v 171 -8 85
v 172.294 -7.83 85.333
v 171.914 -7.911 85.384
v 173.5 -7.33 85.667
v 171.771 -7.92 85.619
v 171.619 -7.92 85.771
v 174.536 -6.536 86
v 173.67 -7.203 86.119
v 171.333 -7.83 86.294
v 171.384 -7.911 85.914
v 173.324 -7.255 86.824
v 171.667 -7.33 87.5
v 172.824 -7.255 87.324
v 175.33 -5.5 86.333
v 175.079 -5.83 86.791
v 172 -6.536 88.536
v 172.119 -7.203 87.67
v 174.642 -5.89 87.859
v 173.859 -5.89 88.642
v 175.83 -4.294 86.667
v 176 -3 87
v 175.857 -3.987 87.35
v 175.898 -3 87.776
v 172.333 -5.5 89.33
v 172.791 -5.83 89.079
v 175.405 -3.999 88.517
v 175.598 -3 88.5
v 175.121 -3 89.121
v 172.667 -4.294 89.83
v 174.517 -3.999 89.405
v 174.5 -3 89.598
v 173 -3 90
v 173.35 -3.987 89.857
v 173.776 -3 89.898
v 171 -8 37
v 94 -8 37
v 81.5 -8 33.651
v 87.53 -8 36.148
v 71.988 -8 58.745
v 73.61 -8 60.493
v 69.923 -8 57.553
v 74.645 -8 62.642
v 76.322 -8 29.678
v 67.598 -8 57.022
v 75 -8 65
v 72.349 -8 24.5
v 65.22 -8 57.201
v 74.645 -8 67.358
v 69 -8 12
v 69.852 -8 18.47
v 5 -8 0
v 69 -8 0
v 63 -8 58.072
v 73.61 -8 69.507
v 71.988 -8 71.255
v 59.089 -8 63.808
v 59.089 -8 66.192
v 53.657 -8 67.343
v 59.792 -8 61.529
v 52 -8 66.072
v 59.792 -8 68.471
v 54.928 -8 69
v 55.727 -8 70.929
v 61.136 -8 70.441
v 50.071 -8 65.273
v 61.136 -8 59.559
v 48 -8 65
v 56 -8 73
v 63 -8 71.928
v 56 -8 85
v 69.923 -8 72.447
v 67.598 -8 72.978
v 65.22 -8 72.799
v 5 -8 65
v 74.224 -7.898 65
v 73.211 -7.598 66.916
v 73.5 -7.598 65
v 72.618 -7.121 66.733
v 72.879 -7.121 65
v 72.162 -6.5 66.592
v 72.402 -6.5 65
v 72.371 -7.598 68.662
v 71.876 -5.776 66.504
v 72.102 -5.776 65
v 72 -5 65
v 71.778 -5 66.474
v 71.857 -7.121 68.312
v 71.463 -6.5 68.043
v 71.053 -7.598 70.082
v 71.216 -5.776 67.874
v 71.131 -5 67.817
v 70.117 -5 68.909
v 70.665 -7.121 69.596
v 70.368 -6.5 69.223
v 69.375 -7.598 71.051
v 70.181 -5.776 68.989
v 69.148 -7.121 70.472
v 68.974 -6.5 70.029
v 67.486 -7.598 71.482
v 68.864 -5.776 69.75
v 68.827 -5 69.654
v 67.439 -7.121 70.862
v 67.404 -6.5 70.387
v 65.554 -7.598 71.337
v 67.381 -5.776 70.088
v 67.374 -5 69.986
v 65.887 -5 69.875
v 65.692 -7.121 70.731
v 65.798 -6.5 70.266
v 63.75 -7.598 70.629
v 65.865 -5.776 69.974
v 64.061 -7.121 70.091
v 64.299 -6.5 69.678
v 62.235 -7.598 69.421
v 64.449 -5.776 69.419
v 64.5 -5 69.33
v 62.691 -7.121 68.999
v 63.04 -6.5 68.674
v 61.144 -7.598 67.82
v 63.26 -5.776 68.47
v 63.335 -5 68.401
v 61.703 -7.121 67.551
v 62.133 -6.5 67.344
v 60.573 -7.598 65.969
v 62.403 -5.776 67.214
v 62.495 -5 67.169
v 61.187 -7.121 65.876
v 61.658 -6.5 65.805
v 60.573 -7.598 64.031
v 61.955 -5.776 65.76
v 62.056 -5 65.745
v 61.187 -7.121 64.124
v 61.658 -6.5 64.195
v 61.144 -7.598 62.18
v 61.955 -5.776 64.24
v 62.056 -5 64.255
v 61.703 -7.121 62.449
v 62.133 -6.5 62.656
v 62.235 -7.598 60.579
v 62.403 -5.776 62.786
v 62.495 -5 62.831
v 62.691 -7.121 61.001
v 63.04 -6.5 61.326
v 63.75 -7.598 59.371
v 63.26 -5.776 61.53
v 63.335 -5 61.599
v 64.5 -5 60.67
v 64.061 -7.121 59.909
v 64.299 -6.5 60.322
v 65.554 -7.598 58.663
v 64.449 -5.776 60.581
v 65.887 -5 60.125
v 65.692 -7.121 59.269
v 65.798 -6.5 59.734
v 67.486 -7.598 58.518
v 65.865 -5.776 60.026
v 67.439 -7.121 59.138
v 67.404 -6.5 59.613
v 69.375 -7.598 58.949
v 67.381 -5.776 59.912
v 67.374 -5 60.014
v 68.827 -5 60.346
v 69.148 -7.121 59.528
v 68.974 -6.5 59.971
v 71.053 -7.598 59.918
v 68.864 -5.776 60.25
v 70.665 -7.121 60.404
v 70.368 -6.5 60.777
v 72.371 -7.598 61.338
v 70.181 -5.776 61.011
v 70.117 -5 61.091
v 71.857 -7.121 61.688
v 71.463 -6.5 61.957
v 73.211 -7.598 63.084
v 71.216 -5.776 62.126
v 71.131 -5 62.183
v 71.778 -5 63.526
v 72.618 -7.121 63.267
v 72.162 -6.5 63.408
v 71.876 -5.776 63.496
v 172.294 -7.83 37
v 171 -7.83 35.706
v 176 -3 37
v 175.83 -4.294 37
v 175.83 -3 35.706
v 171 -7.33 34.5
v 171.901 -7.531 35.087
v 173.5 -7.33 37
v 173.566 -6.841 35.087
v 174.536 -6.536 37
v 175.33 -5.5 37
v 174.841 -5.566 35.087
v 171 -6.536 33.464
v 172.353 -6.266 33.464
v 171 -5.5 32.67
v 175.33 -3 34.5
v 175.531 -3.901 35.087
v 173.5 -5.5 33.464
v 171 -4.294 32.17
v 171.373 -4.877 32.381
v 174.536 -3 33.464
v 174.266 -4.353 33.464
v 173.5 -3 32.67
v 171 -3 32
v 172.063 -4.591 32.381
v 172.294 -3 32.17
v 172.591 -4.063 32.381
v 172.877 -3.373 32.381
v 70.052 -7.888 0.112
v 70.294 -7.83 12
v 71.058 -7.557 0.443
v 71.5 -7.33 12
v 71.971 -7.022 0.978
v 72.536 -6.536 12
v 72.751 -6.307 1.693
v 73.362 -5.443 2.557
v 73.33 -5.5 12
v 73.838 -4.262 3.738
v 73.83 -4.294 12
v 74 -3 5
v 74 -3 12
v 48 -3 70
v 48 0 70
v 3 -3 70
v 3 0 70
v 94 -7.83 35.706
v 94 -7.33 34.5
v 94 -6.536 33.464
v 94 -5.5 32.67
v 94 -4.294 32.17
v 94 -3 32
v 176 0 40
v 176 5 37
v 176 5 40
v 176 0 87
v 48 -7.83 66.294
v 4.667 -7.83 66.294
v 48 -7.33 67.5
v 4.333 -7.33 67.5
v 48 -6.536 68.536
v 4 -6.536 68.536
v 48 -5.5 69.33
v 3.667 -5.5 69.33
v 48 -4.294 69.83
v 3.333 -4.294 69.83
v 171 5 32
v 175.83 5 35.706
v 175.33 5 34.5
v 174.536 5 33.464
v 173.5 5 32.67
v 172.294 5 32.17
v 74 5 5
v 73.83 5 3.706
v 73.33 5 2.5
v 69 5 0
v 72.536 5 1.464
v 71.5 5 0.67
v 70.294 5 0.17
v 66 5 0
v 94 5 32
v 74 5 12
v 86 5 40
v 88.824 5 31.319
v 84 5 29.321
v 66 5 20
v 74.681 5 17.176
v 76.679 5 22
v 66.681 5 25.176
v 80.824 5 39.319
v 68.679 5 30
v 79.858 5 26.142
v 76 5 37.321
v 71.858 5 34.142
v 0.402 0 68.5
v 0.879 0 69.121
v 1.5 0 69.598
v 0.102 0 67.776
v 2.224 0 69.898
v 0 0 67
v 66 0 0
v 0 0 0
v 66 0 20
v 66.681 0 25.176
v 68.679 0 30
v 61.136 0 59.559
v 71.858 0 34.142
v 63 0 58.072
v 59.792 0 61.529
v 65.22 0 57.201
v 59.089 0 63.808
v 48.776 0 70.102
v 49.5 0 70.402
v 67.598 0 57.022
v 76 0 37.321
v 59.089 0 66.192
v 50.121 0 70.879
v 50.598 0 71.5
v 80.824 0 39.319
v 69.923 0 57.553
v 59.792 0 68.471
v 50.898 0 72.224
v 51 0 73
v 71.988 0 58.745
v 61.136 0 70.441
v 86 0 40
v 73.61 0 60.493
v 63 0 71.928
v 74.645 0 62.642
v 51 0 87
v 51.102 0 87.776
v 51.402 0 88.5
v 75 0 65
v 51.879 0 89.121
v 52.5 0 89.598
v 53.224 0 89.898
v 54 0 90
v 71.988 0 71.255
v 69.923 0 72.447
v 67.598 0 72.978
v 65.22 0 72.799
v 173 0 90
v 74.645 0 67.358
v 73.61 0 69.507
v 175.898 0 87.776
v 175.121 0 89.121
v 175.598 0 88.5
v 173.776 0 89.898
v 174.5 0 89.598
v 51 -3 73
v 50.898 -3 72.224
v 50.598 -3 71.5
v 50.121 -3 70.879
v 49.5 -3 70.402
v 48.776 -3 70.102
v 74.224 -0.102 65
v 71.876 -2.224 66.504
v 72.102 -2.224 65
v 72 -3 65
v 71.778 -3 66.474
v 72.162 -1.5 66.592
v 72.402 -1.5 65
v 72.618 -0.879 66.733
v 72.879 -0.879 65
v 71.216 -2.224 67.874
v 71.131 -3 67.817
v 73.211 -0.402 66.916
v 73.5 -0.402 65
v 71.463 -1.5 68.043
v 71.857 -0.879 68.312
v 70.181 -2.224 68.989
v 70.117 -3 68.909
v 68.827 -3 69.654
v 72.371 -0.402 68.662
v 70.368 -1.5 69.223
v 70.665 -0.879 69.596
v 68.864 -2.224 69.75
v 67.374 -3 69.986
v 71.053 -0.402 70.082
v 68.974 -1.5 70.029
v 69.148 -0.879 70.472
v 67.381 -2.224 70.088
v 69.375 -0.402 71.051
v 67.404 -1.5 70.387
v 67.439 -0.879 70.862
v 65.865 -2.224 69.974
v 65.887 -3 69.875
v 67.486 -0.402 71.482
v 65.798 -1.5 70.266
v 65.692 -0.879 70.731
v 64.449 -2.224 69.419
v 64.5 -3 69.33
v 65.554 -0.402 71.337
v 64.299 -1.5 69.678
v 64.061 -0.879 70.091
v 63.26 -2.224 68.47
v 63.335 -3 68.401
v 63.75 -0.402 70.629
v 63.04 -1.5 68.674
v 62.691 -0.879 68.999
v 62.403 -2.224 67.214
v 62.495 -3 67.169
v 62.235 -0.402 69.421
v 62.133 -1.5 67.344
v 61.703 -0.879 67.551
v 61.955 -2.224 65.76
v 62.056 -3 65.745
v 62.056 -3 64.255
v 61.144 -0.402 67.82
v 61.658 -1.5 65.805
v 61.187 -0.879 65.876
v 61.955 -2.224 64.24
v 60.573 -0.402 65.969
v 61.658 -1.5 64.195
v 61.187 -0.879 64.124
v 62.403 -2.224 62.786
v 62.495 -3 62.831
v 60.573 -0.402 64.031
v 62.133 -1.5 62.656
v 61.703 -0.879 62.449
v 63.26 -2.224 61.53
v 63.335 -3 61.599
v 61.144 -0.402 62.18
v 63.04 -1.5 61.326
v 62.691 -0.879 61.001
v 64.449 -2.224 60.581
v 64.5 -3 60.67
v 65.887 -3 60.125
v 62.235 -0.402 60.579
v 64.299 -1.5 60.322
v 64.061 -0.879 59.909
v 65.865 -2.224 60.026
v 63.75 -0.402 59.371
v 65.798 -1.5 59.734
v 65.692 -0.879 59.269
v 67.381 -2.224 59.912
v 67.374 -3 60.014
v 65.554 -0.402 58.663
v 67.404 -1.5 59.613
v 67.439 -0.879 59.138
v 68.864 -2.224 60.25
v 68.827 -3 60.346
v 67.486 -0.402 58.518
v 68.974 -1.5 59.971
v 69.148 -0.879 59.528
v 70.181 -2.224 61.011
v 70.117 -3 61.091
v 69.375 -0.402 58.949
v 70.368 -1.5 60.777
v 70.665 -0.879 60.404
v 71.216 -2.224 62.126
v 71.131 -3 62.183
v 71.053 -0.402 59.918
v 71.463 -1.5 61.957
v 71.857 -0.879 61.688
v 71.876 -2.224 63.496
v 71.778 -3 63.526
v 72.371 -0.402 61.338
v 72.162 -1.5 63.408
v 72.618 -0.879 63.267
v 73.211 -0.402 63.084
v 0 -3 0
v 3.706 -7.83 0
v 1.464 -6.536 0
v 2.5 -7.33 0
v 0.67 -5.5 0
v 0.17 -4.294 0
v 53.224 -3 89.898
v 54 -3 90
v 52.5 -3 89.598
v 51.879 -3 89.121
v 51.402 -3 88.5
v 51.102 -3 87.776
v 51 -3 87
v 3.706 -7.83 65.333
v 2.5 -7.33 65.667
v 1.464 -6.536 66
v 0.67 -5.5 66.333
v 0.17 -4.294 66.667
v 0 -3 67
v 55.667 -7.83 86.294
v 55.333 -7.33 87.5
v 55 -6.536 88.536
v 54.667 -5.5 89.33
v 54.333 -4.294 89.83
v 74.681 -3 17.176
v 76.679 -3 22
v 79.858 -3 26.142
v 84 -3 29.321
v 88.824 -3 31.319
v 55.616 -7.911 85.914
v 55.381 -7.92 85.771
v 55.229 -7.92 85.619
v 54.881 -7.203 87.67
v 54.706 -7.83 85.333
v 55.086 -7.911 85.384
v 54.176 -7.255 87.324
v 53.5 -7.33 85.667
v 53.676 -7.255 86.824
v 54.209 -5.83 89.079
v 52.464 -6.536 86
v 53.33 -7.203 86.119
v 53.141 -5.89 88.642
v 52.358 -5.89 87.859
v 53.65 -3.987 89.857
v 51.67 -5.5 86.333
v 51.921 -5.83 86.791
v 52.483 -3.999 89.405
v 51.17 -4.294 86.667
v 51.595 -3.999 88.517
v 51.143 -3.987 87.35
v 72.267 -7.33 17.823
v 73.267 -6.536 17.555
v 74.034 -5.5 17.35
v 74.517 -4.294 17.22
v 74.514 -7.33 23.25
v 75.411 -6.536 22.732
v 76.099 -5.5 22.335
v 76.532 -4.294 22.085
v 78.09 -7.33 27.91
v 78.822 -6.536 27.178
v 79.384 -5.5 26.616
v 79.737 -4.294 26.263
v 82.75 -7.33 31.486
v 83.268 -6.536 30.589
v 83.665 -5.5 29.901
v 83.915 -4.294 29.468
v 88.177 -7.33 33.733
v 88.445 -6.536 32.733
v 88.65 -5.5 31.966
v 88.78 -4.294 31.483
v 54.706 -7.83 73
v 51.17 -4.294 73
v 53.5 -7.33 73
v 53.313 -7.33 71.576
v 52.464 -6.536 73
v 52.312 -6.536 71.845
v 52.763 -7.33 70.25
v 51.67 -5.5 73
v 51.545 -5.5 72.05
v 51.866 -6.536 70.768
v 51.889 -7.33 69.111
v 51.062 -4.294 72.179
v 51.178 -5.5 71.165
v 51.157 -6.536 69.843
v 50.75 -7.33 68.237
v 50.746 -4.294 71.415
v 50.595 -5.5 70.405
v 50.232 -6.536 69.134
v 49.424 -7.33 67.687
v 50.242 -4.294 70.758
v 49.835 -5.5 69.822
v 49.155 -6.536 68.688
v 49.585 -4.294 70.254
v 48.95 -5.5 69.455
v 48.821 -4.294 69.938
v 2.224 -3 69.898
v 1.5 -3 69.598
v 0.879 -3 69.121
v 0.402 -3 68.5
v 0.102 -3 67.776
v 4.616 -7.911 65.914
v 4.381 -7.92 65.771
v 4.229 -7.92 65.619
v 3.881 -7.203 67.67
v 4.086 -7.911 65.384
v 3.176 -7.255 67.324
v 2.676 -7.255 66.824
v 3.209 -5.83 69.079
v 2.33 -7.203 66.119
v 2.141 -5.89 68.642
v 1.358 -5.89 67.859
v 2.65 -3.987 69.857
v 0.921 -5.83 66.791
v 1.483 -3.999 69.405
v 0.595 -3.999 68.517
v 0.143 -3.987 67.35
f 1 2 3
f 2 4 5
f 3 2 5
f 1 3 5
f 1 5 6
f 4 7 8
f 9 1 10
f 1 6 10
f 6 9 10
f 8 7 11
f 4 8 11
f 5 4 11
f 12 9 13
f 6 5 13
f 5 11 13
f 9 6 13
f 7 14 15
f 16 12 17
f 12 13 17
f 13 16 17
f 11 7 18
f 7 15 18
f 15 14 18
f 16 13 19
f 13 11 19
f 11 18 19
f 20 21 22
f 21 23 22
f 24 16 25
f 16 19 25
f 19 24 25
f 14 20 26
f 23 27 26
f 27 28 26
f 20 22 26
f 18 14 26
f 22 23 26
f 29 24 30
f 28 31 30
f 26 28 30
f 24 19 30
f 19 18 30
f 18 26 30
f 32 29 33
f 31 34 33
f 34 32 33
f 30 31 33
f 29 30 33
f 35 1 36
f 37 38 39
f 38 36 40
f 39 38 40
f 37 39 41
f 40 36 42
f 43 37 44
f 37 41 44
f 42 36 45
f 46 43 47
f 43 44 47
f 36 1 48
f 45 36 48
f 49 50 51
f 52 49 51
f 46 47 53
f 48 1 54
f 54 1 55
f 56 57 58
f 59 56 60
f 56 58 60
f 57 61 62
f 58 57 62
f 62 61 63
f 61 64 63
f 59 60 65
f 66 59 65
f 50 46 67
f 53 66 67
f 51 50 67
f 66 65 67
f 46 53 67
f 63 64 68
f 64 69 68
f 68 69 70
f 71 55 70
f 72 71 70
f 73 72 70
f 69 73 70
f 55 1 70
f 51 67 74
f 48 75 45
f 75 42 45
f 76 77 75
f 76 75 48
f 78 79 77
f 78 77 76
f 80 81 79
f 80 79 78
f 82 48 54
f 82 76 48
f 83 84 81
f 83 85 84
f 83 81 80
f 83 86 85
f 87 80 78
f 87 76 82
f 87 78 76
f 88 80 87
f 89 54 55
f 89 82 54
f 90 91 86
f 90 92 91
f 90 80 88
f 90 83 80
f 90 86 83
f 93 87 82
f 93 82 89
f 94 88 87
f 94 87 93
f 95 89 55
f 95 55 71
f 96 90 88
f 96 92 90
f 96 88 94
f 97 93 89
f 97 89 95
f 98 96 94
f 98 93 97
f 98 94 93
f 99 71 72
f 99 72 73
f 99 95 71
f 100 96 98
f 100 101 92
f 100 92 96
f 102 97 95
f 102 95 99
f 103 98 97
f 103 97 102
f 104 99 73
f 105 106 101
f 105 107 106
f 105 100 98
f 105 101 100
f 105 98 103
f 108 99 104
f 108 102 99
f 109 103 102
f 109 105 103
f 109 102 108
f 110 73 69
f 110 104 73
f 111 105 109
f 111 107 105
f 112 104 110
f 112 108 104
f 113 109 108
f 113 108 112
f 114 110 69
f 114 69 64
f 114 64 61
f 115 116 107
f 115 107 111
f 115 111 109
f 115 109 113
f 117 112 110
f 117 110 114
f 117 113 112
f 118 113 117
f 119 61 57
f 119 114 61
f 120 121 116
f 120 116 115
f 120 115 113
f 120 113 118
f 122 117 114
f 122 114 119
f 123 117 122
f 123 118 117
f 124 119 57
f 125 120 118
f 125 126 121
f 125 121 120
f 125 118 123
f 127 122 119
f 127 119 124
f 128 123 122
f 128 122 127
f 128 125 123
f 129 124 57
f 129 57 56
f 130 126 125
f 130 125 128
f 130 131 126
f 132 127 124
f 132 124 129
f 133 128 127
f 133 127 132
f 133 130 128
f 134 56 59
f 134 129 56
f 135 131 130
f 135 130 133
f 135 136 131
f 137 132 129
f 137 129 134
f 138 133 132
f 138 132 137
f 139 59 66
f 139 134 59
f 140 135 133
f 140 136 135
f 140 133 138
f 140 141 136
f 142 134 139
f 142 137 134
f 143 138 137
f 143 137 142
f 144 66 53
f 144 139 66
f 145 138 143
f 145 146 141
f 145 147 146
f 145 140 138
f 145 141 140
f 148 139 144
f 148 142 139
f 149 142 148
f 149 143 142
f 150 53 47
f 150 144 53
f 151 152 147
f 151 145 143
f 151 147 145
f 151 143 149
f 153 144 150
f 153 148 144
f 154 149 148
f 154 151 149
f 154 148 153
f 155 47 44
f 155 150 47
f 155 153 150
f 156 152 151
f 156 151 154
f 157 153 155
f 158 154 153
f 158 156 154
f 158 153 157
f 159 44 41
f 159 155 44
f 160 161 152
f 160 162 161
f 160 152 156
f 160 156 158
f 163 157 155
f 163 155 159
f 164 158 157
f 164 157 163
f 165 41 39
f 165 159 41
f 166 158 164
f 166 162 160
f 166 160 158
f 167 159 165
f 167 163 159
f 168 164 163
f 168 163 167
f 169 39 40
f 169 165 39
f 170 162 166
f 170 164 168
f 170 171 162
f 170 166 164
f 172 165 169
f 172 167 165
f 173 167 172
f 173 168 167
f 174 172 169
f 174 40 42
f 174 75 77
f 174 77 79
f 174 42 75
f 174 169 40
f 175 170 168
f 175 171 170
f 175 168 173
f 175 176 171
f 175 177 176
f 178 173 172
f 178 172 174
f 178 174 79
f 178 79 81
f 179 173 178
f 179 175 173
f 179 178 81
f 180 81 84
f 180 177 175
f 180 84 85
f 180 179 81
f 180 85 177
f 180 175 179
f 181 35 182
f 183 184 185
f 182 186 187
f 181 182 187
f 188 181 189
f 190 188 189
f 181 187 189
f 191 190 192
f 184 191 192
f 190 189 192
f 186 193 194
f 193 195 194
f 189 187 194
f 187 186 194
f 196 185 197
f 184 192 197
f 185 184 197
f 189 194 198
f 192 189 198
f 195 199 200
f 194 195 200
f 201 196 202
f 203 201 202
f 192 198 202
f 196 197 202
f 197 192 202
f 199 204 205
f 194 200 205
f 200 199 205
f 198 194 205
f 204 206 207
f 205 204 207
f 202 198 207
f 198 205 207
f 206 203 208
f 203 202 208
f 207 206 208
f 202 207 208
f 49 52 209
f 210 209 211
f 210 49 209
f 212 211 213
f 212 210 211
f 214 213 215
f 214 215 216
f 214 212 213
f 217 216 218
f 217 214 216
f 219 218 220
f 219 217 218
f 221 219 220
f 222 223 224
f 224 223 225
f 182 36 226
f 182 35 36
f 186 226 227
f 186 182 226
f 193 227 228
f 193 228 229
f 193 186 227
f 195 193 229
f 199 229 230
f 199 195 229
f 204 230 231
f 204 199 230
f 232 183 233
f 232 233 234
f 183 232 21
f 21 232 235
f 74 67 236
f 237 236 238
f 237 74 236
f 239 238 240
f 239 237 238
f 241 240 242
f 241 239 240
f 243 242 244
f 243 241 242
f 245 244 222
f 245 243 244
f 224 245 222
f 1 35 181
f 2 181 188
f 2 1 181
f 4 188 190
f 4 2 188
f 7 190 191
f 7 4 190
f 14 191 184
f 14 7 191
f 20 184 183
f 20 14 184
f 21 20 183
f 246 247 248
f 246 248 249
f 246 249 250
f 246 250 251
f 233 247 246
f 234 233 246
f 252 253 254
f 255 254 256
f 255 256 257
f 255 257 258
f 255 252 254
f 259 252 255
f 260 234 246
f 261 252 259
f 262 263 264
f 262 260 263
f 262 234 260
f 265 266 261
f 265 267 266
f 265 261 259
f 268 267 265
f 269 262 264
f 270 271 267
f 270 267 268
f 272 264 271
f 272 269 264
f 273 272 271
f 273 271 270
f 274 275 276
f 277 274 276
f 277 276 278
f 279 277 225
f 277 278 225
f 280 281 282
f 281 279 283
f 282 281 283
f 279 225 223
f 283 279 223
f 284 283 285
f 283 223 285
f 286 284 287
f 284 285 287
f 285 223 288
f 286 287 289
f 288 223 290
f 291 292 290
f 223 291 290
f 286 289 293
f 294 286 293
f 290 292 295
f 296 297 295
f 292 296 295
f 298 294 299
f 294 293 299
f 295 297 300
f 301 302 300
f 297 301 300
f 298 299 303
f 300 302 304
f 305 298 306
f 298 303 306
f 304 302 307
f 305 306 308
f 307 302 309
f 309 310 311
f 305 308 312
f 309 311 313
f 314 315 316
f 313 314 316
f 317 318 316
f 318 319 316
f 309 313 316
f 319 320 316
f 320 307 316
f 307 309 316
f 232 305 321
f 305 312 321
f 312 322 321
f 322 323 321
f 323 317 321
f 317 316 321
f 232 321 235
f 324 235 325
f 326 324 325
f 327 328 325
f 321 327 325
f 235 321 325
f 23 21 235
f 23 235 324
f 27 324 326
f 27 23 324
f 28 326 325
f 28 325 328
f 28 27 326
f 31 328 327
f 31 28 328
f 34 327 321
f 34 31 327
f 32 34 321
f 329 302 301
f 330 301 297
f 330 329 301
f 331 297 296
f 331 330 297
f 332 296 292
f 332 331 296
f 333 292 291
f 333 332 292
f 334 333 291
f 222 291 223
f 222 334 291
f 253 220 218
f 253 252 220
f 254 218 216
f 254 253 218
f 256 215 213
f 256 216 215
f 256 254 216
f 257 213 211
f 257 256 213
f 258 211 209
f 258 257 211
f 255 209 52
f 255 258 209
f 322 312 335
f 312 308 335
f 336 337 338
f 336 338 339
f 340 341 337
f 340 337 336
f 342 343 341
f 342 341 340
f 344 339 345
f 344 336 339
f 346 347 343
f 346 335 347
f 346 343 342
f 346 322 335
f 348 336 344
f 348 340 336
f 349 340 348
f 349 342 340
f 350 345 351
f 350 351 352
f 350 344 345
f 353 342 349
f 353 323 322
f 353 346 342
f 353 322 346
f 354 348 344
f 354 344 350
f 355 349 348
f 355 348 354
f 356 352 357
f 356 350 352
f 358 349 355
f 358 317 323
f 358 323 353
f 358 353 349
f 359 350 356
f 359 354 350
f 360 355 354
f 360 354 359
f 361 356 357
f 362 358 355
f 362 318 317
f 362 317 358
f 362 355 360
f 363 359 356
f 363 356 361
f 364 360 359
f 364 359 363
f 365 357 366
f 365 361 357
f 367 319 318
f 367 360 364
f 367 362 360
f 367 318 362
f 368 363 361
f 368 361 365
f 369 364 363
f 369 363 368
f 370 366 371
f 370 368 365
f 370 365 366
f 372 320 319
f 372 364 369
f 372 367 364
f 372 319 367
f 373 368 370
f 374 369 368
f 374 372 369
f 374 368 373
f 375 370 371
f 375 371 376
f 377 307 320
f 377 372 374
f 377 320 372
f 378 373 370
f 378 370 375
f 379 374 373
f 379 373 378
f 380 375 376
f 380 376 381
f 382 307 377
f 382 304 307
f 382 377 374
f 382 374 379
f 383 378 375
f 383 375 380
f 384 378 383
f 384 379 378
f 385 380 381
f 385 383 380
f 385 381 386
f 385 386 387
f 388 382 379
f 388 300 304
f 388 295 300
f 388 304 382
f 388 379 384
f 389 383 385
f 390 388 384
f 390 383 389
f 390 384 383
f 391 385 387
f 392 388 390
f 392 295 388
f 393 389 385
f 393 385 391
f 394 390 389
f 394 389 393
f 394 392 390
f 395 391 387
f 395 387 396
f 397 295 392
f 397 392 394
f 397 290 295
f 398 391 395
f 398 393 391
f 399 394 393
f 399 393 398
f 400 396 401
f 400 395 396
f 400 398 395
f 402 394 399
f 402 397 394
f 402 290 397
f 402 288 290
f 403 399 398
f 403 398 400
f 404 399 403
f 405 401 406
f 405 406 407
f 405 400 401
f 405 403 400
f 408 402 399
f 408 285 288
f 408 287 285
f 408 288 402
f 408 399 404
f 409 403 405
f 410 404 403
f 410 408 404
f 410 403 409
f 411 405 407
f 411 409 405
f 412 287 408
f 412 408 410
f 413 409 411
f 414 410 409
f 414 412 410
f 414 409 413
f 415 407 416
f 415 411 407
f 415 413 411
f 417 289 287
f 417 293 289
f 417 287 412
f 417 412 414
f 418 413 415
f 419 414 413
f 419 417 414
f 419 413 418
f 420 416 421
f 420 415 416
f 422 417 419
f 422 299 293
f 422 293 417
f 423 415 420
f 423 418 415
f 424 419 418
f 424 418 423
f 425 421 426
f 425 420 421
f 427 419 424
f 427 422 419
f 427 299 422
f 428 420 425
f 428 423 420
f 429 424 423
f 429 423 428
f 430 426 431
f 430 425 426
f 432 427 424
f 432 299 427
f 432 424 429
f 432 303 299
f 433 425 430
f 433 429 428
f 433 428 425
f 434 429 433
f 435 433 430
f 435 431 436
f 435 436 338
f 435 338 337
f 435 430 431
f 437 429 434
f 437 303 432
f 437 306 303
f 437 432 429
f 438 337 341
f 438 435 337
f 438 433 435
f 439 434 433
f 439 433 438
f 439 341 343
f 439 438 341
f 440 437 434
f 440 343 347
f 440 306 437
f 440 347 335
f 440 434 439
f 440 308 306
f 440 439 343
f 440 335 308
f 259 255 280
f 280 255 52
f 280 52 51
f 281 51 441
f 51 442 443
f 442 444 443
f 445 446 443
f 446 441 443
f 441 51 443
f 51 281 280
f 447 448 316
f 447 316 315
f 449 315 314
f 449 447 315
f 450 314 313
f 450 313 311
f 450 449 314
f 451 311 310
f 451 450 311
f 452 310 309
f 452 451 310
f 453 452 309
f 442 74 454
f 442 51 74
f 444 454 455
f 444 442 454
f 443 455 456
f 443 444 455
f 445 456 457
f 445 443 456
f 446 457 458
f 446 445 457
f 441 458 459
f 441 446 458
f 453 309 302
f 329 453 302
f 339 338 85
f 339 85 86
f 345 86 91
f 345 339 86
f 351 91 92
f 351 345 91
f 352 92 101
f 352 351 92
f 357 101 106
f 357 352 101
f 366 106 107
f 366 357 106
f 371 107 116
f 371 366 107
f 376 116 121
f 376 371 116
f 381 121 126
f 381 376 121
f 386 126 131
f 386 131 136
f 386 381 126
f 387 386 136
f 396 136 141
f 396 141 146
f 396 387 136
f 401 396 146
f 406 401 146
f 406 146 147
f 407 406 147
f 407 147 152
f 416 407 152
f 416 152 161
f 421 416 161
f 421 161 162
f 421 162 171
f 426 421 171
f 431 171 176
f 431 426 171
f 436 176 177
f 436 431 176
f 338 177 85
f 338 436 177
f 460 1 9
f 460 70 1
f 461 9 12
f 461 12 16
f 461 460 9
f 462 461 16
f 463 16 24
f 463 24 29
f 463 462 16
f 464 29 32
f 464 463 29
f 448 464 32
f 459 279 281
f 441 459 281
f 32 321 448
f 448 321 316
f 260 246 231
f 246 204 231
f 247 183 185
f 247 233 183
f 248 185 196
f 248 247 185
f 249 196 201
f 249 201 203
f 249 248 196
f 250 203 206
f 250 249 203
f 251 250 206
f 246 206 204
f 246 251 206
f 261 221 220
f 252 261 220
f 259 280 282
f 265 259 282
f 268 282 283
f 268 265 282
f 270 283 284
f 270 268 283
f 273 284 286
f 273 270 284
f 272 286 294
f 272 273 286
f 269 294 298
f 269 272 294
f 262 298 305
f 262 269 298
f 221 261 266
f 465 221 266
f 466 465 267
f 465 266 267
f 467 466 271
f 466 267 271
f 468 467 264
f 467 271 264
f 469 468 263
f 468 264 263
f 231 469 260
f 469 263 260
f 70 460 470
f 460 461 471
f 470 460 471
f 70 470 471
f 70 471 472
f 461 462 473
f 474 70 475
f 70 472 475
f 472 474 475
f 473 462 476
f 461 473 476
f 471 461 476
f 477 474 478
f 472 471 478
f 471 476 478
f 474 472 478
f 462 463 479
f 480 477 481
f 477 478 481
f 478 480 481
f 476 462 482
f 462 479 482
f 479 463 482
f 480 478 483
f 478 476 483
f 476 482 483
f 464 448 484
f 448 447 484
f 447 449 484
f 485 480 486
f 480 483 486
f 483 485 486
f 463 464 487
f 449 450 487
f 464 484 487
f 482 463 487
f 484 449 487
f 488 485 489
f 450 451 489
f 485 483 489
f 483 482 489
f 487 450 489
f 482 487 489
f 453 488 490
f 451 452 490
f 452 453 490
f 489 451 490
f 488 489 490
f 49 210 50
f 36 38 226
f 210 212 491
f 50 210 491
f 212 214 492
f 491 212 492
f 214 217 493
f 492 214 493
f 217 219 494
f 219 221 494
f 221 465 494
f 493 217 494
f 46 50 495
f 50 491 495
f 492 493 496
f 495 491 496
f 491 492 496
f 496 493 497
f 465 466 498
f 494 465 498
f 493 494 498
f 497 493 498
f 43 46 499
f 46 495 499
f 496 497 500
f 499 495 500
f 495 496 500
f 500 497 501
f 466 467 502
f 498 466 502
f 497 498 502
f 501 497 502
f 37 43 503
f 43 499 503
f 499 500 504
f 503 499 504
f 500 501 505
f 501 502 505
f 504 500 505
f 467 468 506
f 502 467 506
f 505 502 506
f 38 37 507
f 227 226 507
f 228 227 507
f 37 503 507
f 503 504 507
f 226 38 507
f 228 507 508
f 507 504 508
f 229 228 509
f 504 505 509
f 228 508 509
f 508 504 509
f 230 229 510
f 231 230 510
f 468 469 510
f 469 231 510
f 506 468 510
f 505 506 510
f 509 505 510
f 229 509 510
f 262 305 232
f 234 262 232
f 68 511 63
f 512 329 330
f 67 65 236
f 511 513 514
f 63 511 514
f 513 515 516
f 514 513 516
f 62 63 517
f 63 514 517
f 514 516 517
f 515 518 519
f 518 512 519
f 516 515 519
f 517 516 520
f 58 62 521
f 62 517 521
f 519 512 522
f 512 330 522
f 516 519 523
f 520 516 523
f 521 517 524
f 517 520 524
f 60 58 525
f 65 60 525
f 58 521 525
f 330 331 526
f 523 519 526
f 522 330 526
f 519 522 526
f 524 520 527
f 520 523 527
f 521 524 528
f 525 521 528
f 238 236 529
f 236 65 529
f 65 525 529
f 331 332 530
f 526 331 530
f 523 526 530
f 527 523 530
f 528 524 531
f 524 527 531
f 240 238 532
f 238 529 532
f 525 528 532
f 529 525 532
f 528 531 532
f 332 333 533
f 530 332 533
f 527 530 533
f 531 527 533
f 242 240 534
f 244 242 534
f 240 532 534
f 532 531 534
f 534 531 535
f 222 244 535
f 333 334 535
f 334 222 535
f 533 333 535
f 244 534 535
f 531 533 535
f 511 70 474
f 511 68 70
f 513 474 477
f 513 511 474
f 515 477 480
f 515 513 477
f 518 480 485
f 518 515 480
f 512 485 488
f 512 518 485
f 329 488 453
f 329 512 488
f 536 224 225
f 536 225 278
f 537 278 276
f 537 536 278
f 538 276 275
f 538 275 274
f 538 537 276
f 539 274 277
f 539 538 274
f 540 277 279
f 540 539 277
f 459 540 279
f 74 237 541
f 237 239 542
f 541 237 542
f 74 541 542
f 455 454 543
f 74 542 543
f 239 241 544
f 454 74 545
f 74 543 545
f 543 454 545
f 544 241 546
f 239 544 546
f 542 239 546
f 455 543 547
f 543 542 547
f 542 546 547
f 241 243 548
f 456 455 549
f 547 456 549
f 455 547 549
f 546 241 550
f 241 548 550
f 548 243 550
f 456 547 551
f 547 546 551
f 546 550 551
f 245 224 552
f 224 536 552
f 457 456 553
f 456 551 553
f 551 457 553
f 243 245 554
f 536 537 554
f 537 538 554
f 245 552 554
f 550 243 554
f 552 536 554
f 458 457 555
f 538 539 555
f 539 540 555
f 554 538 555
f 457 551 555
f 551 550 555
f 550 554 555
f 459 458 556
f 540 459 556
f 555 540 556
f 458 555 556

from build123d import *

# Parameters (mm, degrees)
SKETCH_R     = 5
PAD_DEPTH    = 8
PAD001_DEPTH = 13
FILLET_R     = 3
FILLET001_R  = 5
FILLET002_R  = 20
FILLET003_R  = 5
FILLET004_R  = 3


with BuildPart() as part:
    # Sketch → Pad (new body)
    with BuildSketch(Plane.XZ):
        Polygon((0, 0), (66, 0), (66, 40), (176, 40), (176, 90), (51, 90), (51, 70), (11, 70), (0, 70), align=None)
        with Locations((67, 65)):
            Circle(SKETCH_R, mode=Mode.SUBTRACT)
    extrude(amount=PAD_DEPTH)

    # Sketch001 (on Face12 of Pad) → Pad001 (join)
    with BuildSketch(Plane.XZ.offset(8)):
        Polygon((66, 0), (66, 40), (176, 40), (176, 32), (74, 32), (74, 0), align=None)
    extrude(amount=-PAD001_DEPTH)

    # Fillet
    fillet_edges = [part.edges().sort_by_distance(p)[0] for p in [
        (176, -4, 90),
        (51, -4, 90),
        (51, -4, 70),
        (0, -4, 70),
    ]]
    fillet(fillet_edges, radius=FILLET_R)

    # Fillet001
    fillet001_edges = [part.edges().sort_by_distance(p)[0] for p in [
        (0, -8, 33.5),
    ]]
    fillet(fillet001_edges, radius=FILLET001_R)

    # Fillet002
    fillet002_edges = [part.edges().sort_by_distance(p)[0] for p in [
        (66, 2.5, 40),
        (74, -1.5, 32),
    ]]
    fillet(fillet002_edges, radius=FILLET002_R)

    # Fillet003
    fillet003_edges = [part.edges().sort_by_distance(p)[0] for p in [
        (79.857864, -8, 26.142136),
        (74, -1.5, 0),
    ]]
    fillet(fillet003_edges, radius=FILLET003_R)

    # Fillet004
    fillet004_edges = [part.edges().sort_by_distance(p)[0] for p in [
        (62, -8, 65),
        (62, 0, 65),
    ]]
    fillet(fillet004_edges, radius=FILLET004_R)


solid = part.part
